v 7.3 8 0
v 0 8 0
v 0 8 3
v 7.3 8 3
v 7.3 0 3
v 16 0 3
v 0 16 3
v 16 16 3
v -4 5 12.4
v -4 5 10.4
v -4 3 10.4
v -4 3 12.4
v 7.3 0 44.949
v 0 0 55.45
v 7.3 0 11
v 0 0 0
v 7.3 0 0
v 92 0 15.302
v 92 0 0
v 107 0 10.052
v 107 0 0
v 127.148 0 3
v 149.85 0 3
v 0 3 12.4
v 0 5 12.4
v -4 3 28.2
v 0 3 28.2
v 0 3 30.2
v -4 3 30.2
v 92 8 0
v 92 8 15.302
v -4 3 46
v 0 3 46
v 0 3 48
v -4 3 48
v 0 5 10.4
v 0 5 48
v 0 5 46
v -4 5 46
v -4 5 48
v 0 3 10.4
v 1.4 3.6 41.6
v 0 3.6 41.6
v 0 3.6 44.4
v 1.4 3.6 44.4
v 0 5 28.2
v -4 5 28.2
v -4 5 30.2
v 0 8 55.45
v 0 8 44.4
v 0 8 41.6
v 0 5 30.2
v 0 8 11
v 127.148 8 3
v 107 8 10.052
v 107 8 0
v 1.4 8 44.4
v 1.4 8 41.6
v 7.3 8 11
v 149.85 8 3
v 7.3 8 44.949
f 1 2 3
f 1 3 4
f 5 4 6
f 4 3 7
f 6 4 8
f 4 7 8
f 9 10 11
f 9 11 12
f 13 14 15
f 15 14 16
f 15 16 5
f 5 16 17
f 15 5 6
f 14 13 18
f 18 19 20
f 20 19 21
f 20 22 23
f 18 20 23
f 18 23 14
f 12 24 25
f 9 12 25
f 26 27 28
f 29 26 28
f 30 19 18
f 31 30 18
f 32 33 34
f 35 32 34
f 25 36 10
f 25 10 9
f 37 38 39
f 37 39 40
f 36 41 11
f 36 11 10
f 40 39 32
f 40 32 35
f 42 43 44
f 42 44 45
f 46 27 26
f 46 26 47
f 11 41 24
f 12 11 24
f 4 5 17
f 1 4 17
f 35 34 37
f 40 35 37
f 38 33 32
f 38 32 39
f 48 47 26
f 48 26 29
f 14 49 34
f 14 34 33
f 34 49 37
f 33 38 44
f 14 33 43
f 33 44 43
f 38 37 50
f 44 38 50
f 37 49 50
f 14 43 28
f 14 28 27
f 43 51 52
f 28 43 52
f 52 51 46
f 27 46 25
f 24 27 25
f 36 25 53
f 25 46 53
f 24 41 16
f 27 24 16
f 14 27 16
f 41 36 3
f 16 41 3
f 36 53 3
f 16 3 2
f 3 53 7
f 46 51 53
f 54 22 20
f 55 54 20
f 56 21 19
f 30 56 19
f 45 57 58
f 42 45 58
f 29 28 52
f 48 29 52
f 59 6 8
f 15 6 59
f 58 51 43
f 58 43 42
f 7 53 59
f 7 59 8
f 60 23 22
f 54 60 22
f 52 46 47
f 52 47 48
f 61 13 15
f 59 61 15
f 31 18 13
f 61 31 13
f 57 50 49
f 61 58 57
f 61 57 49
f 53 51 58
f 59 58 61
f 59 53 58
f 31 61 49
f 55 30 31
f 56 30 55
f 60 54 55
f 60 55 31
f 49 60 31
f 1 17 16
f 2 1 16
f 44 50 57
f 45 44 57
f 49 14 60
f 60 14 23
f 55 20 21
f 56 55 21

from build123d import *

# Parameters (mm, degrees)
P_IDAT_VYSUNUT_M1_DEPTH  = 8
SKICA2_W                 = 1.4
SKICA2_H                 = 2.8
ODEBRAT_VYSUNUT_M1_DEPTH = 4.4
SKICA3_W                 = 2
SKICA3_H                 = 2
P_IDAT_VYSUNUT_M2_DEPTH  = 4
P_IDAT_START             = 8
SKICA5_W                 = 16
SKICA5_H                 = 8
P_IDAT_VYSUNUT_M4_DEPTH  = 16
ODEBRAT_VYSUNUT_M2_DEPTH = 161.57934176
ODEBRAT_VYSUNUT_M3_DEPTH = 161.57934176


with BuildPart() as part:
    # Skica1 → Přidat vysunutím1 (new body)
    with BuildSketch(Plane(origin=(0, 0, 0), x_dir=(1, 0, 0), z_dir=(0, 1, 0))):
        Polygon((0, 0), (0, -55.45), (149.85, -3), (127.147799643, -3), (107, -10.052066008), (107, 0), (92, 0), (92, -15.302316258), (7.3, -44.948729338), (7.3, 0), align=None)
    extrude(amount=P_IDAT_VYSUNUT_M1_DEPTH)

    # Skica2 → Odebrat vysunutím1 (cut)
    with BuildSketch(Plane(origin=(0, 8, 0), x_dir=(1, 0, 0), z_dir=(0, 1, 0))):
        with Locations((0.7, -43)):
            Rectangle(SKICA2_W, SKICA2_H)
    extrude(amount=-ODEBRAT_VYSUNUT_M1_DEPTH, mode=Mode.SUBTRACT)

    # Skica3 → Přidat vysunutím2 (add)
    with BuildSketch(Plane.ZY):
        with Locations((11.4, 4)):
            Rectangle(SKICA3_W, SKICA3_H)
        with Locations((29.2, 4)):
            Rectangle(SKICA3_W, SKICA3_H)
        with Locations((47, 4)):
            Rectangle(SKICA3_W, SKICA3_H)
    extrude(amount=P_IDAT_VYSUNUT_M2_DEPTH)

    # Skica5 → Přidat vysunutím4 (add)
    with BuildSketch(Plane(origin=(0, 8, 0), x_dir=(1, 0, 0), z_dir=(0, 1, 0)).offset(P_IDAT_START)):
        with Locations((8, -7)):
            Rectangle(SKICA5_W, SKICA5_H)
    extrude(amount=-P_IDAT_VYSUNUT_M4_DEPTH)

    # Skica6 → Odebrat vysunutím2 (cut, through all)
    with BuildSketch(Plane.ZY):
        Polygon((3, 16), (11, 16), (11, 8), align=None)
    extrude(amount=-ODEBRAT_VYSUNUT_M2_DEPTH, mode=Mode.SUBTRACT)

    # Skica7 → Odebrat vysunutím3 (cut, through all)
    with BuildSketch(Plane.XZ):
        Polygon((7.3, 11), (16, 11), (16, 3), align=None)
    extrude(amount=-ODEBRAT_VYSUNUT_M3_DEPTH, mode=Mode.SUBTRACT)


solid = part.part
